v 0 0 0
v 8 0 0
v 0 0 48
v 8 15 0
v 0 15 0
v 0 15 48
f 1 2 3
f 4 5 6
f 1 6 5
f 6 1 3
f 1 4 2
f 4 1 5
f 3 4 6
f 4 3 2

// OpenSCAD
module prism(l, w, h) {
       polyhedron(points=[
               [0,0,h],           // 0    front top corner
               [0,0,0],[w,0,0],   // 1, 2 front left & right bottom corners
               [0,l,h],           // 3    back top corner
               [0,l,0],[w,l,0]    // 4, 5 back left & right bottom corners
       ], faces=[ // points for all faces must be ordered clockwise when looking in
               [0,2,1],    // top face
               [3,4,5],    // base face
               [0,1,4,3],  // h face
               [1,2,5,4],  // w face
               [0,3,5,2],  // hypotenuse face
       ]);
}

prism(15, 8,48);
